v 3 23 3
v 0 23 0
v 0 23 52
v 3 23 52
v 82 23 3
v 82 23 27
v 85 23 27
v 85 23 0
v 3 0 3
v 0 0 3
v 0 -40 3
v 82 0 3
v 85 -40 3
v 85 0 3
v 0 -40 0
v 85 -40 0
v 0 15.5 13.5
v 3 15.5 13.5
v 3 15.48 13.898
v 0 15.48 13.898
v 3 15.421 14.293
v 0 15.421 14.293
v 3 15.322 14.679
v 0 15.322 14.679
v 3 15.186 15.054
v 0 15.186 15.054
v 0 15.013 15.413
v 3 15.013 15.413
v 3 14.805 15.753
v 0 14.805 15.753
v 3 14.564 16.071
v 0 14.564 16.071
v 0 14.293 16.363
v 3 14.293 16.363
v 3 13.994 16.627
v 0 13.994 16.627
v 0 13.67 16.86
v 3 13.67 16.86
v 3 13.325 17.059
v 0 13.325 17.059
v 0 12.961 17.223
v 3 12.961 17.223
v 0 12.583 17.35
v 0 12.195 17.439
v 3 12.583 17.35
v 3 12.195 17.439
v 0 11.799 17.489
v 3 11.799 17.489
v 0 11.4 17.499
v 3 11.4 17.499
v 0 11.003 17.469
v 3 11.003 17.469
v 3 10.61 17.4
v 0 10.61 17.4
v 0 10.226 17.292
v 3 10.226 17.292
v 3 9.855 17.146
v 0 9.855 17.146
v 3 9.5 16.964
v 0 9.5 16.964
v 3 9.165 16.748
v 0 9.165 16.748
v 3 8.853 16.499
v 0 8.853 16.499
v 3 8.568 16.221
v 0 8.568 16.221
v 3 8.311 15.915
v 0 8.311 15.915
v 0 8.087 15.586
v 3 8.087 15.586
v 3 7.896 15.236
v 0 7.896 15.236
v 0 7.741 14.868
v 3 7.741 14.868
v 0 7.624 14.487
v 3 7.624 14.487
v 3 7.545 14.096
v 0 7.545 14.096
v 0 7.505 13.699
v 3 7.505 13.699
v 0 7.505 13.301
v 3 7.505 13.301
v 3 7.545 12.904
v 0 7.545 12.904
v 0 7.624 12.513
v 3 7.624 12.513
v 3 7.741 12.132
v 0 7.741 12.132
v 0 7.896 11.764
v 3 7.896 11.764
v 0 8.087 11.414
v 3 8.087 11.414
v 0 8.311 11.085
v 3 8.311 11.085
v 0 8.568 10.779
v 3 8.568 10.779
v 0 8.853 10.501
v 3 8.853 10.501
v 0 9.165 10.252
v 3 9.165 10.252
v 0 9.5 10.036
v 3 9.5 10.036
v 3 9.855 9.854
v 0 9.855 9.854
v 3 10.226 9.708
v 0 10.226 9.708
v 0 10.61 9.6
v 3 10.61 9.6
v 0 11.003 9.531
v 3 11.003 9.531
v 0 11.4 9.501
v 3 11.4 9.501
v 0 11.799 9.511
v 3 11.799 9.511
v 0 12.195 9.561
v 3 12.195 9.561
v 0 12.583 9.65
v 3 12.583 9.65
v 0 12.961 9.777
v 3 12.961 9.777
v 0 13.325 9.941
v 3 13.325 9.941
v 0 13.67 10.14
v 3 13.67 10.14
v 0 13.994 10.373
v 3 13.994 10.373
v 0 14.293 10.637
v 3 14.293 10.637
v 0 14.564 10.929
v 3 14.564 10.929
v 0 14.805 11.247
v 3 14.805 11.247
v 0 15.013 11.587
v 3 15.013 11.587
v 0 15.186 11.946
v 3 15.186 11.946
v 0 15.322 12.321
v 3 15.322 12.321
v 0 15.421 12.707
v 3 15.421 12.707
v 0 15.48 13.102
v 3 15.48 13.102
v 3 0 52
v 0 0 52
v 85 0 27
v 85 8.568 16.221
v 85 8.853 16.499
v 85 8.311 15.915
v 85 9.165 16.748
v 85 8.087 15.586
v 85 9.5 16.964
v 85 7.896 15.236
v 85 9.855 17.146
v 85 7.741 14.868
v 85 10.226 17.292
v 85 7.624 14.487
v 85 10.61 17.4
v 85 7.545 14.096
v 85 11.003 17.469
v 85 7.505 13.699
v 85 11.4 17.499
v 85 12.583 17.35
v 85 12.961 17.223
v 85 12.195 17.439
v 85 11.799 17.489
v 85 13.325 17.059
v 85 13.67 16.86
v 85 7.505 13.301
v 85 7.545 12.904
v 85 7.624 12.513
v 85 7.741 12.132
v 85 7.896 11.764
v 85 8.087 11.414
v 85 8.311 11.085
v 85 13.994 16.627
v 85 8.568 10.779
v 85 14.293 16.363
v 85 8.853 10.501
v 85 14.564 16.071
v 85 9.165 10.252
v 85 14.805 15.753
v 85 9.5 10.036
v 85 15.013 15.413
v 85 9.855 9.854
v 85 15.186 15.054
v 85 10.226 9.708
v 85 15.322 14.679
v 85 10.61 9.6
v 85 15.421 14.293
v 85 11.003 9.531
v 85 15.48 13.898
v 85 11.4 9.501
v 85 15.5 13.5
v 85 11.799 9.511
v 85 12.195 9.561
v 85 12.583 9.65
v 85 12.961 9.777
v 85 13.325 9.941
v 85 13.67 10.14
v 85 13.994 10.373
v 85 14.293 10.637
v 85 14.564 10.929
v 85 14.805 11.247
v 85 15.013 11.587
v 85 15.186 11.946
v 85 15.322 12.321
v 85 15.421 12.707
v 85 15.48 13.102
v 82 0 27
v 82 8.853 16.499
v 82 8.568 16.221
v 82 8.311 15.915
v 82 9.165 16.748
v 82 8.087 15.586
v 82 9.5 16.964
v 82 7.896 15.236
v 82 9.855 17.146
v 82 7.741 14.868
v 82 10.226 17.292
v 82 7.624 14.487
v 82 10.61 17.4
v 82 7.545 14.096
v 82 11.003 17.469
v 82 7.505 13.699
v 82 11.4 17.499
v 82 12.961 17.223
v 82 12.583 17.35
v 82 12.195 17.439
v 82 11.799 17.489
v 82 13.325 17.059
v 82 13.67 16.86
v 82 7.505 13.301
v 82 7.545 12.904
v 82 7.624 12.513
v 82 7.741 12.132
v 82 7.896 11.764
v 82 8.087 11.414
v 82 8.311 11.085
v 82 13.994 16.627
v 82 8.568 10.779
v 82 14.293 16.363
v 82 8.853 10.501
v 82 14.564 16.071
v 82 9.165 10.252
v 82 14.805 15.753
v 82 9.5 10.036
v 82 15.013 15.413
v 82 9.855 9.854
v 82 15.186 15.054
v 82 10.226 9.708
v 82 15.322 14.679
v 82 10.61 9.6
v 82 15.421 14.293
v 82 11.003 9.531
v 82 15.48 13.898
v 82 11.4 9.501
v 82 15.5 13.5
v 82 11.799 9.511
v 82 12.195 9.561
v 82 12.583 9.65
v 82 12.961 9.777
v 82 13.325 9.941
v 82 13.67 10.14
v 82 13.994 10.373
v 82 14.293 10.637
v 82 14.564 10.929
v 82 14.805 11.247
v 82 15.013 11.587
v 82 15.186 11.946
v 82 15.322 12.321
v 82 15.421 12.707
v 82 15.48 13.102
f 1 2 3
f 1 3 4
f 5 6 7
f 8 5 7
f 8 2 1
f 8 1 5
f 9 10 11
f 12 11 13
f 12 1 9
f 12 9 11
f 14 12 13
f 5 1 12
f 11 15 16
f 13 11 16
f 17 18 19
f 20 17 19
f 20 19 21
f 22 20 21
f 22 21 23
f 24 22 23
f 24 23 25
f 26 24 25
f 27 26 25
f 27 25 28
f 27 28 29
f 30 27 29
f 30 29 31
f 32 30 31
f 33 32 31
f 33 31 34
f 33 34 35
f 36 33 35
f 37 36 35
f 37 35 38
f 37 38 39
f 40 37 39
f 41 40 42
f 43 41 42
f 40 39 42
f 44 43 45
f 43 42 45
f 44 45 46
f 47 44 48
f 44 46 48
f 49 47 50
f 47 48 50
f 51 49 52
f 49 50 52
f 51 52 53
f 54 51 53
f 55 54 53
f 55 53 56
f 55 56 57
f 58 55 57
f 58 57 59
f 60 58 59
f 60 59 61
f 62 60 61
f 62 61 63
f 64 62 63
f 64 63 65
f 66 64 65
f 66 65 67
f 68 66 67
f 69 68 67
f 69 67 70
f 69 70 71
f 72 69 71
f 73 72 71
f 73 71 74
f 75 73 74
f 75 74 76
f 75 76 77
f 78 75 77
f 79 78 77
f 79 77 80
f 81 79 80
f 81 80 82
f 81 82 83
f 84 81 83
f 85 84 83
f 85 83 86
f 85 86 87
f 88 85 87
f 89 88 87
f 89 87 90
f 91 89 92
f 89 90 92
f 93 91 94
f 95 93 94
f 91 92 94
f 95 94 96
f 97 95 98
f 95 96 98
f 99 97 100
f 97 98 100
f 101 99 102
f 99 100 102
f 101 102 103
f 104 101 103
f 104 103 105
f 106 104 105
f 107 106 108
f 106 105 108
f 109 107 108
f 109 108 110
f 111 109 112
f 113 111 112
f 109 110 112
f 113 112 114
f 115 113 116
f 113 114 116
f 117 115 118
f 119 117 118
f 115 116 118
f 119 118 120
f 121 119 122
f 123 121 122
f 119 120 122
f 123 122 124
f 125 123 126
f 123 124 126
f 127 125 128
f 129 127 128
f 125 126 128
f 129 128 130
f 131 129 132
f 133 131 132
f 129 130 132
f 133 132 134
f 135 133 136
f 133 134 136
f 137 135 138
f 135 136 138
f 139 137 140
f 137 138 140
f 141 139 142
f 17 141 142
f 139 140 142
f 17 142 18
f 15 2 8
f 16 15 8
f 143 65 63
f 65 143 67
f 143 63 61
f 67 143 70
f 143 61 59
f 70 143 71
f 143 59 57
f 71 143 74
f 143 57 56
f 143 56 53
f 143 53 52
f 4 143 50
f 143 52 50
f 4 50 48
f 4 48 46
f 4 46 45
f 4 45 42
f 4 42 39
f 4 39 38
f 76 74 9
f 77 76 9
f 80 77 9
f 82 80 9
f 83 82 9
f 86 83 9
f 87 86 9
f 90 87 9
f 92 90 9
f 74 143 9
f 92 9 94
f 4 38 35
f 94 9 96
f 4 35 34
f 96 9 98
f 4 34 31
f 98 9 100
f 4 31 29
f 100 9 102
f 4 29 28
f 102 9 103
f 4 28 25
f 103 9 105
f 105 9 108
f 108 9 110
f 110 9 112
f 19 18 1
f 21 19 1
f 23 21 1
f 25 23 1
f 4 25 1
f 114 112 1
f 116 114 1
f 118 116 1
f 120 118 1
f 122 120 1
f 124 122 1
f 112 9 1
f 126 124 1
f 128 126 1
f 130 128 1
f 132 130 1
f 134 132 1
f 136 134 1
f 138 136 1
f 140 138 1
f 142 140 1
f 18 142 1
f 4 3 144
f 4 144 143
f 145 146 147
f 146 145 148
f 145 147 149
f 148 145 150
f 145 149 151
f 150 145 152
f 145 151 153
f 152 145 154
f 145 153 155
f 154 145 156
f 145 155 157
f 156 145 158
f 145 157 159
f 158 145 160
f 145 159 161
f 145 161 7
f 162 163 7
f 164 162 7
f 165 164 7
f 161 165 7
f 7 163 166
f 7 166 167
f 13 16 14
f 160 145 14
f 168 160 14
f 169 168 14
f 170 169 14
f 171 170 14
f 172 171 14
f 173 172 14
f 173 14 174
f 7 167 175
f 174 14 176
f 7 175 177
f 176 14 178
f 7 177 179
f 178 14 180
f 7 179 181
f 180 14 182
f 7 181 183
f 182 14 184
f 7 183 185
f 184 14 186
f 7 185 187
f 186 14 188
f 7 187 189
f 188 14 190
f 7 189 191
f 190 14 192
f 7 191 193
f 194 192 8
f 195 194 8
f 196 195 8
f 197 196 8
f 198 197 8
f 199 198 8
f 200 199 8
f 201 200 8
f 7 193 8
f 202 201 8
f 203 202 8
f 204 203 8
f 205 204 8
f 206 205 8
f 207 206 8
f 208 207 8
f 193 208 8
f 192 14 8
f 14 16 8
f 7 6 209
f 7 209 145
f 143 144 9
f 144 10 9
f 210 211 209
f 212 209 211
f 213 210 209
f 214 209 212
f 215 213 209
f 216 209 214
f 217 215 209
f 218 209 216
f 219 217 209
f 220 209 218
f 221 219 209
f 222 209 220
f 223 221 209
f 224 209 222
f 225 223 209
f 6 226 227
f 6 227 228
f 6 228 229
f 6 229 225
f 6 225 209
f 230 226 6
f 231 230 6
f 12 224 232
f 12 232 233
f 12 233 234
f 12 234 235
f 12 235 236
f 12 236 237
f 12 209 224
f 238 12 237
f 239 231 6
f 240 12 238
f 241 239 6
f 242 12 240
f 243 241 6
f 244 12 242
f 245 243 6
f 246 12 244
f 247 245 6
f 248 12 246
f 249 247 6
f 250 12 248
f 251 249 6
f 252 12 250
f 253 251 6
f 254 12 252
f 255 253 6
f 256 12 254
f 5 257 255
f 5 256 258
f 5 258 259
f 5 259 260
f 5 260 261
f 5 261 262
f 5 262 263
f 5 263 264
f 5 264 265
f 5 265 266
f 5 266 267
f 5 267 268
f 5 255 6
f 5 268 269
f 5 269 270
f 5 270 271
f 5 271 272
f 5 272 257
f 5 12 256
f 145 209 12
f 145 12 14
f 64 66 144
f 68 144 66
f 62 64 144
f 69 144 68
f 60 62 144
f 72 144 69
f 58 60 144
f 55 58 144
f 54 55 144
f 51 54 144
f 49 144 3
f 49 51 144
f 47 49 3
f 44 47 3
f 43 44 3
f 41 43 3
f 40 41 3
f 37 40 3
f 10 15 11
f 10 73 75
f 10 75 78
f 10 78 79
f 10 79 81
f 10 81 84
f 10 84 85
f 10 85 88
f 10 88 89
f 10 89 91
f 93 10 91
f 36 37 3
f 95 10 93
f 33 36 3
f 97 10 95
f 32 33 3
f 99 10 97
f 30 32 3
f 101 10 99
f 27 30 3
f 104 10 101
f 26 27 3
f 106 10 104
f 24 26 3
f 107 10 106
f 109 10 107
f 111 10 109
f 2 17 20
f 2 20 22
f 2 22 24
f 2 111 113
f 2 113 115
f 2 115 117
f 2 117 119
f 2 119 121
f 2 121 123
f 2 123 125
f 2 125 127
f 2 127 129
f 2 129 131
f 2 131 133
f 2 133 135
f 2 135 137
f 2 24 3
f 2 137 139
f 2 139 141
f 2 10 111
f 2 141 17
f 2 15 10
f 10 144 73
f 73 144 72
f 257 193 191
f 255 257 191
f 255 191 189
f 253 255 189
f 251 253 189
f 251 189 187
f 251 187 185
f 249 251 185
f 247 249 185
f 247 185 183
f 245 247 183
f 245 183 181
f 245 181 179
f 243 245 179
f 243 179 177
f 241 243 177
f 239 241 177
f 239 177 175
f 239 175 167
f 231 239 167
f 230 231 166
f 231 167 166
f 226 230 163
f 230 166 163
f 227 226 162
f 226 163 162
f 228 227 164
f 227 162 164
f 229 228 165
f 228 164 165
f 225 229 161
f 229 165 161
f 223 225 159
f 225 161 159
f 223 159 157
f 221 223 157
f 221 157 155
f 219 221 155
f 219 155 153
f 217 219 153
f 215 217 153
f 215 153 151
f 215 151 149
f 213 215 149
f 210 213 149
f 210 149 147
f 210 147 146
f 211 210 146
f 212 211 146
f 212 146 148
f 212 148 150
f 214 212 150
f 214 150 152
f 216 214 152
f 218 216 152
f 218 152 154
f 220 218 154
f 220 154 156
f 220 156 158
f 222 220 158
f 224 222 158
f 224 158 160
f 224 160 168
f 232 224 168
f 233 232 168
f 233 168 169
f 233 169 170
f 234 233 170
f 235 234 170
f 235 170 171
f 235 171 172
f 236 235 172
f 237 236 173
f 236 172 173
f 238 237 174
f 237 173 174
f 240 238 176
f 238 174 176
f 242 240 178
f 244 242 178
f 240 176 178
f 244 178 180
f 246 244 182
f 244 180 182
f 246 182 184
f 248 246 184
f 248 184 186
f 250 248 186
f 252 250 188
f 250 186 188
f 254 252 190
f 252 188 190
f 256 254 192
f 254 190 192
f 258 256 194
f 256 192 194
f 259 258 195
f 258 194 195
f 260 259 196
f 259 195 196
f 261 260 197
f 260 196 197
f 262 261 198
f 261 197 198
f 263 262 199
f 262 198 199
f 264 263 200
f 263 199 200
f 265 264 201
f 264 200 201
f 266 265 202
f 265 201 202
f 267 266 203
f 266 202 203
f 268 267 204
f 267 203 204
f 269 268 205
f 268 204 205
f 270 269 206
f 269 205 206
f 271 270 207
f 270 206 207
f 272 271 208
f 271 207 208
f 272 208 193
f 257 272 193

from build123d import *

# Parameters (mm, degrees)
F0_W     = 85
F0_H     = 23
F0_H_2   = 40
F1_DEPTH = 3
F2_W     = 3
F2_H     = 23
F3_DEPTH = 24
F4_W     = 3
F4_H     = 23
F5_DEPTH = 25
F6_R     = 4
F7_DEPTH = 200


with BuildPart() as f1:
    # F0 (on Top) → F1 (new body)
    with BuildSketch(Plane.XY):
        with Locations((42.5, 11.5)):
            Rectangle(F0_W, F0_H)
        with Locations((42.5, -20)):
            Rectangle(F0_W, F0_H_2)
    extrude(amount=F1_DEPTH)

    # F2 (on face) → F3 (join)
    with BuildSketch(Plane.XY.offset(3)):
        with Locations((1.5, 11.5)):
            Rectangle(F2_W, F2_H)
        with Locations((83.5, 11.5)):
            Rectangle(F2_W, F2_H)
    extrude(amount=F3_DEPTH)

    # F4 (on face) → F5 (join)
    with BuildSketch(Plane.XY.offset(27)):
        with Locations((1.5, 11.5)):
            Rectangle(F4_W, F4_H)
    extrude(amount=F5_DEPTH)

    # F6 (on face) → F7 (cut)
    with BuildSketch(Plane.YZ.offset(85)):
        with Locations((11.5, 13.5)):
            Circle(F6_R)
    extrude(amount=-F7_DEPTH, mode=Mode.SUBTRACT)


solid = f1.part
